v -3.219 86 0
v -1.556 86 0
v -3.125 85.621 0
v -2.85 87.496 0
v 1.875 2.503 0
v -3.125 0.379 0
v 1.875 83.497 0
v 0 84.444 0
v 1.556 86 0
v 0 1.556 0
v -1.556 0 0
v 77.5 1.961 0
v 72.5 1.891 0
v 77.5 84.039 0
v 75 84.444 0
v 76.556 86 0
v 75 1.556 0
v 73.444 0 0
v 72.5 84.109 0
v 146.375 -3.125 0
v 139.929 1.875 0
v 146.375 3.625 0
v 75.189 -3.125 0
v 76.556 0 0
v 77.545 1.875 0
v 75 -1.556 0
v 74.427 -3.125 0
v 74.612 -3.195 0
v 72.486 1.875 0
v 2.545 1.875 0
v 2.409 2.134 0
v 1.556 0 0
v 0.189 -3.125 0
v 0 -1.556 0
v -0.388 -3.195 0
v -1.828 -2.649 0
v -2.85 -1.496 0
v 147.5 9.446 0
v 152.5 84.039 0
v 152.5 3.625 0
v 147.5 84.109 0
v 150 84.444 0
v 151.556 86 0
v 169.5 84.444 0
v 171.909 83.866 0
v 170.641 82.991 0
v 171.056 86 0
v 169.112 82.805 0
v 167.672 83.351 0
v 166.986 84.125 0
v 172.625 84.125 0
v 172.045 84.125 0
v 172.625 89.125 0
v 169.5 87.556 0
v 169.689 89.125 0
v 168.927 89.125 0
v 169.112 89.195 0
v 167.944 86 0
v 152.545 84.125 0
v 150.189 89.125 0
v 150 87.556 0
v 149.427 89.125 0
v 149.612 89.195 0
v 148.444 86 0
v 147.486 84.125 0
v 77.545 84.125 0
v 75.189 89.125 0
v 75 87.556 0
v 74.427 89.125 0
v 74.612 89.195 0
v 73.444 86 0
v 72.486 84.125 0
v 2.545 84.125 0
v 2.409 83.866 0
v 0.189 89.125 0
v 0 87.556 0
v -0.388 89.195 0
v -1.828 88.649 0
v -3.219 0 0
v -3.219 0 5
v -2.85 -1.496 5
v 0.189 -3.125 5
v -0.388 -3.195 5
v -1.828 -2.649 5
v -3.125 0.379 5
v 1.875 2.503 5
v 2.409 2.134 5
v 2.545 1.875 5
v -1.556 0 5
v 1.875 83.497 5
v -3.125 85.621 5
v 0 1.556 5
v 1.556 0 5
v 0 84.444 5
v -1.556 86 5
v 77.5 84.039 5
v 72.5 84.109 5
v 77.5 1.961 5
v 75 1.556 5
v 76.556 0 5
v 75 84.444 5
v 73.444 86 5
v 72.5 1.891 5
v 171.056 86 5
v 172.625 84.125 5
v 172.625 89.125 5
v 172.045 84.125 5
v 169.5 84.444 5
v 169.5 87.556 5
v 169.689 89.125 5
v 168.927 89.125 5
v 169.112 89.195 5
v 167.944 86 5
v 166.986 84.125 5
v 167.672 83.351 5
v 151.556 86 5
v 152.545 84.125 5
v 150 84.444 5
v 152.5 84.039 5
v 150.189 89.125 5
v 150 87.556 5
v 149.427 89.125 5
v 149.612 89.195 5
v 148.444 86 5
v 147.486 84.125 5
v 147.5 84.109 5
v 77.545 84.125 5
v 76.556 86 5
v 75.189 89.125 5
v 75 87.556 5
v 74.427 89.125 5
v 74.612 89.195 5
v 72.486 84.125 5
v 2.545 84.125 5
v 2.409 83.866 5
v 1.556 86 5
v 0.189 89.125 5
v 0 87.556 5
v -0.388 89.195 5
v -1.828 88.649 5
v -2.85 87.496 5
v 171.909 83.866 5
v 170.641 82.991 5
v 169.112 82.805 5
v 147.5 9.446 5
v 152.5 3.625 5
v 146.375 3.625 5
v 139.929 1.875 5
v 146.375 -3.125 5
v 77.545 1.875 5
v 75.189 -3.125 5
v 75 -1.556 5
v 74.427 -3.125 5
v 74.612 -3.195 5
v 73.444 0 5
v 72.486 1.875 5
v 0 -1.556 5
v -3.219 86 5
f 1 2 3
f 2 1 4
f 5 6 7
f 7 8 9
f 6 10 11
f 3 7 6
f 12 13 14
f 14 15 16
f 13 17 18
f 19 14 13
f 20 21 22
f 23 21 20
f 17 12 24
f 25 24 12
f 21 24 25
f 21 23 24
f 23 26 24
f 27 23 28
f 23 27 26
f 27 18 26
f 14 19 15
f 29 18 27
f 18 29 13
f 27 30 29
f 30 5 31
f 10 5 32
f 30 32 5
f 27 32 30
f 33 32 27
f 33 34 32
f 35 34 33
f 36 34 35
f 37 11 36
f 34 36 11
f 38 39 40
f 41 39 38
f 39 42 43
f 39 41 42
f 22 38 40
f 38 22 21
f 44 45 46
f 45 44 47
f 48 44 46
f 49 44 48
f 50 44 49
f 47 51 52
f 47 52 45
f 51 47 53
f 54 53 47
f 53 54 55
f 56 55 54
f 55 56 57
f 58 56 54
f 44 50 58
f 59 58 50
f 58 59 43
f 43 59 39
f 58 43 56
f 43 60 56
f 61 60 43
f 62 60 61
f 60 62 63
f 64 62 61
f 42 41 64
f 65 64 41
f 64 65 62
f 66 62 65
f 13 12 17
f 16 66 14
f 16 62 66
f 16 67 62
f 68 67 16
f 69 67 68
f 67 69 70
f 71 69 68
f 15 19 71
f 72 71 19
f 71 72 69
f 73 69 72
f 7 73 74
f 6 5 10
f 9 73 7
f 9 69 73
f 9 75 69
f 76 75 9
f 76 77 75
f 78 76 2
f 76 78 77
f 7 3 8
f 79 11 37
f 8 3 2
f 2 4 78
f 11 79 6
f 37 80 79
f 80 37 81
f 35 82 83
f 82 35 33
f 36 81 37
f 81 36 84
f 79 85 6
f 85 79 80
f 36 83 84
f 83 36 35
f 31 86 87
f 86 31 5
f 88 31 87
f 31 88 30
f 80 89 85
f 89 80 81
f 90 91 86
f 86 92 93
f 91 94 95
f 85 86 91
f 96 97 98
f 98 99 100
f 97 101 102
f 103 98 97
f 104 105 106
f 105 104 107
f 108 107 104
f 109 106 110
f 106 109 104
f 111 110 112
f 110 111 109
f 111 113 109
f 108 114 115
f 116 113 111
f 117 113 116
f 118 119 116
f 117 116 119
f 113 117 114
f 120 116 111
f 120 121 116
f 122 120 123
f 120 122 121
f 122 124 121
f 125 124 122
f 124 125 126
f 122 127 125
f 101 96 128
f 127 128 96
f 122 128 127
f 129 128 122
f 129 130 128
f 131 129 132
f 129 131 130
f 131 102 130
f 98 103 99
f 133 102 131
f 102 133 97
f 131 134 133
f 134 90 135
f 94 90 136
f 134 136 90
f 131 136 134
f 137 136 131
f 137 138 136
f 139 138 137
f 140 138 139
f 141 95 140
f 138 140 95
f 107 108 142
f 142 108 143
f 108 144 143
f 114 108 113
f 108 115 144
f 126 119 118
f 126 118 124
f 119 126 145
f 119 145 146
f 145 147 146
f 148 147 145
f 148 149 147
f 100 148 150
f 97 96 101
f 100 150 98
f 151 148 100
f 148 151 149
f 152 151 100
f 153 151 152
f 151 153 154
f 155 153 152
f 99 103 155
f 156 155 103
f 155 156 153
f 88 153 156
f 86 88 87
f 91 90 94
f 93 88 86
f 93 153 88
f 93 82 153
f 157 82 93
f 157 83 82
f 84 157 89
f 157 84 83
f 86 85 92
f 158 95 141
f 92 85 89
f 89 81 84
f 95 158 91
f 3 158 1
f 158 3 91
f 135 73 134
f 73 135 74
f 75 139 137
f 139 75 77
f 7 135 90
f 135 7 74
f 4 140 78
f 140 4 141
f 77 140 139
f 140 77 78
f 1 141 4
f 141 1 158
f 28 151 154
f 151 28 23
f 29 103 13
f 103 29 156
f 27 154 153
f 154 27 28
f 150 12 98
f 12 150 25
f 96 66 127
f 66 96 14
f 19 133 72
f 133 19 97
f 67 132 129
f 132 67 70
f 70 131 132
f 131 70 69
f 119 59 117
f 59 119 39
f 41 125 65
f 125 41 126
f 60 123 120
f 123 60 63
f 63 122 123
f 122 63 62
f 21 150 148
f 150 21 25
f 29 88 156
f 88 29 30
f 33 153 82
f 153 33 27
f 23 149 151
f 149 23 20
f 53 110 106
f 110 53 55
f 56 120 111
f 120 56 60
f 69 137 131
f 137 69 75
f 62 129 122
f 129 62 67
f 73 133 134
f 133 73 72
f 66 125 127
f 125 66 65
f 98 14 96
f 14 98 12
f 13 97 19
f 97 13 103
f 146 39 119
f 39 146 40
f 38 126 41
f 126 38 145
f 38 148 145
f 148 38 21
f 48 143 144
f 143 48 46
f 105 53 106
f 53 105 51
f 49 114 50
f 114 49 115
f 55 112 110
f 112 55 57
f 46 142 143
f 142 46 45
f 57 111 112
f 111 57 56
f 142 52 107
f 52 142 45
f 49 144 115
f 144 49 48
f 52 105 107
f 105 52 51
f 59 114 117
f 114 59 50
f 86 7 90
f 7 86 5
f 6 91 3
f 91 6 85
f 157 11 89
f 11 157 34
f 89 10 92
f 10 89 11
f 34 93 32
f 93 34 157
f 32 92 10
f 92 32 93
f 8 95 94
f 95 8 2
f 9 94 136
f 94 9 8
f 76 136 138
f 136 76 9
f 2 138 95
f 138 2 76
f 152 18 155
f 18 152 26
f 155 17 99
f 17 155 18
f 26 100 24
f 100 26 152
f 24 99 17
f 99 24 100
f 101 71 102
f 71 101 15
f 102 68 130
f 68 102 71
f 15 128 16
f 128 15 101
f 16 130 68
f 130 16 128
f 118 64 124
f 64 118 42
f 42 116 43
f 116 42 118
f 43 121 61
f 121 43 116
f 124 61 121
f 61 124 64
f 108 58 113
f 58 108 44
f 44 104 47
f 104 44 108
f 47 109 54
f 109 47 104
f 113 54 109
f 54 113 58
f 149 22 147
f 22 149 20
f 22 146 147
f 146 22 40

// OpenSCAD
/**
 * Combine with '32x8 LED Matrix grid for diffuser'
 * https://www.thingiverse.com/thing:1903744
 *
 * 12x 2.6x10mm plastic screws
 *
 *   -- noah@hack.se, 2018
 *
 */


module polyhole(d, h) {
    n = max(round(2 * d),3);
    rotate([0,0,180])
        cylinder(h = h, r = (d / 2) / cos (180 / n), $fn = n);
}

thickness=5;
cylSize=6.25;
screwXDistance=75;
screwYDistance=86;

difference() {
    union() {
        // 2x3 screw holes
        for(x=[0,1,2]) {
            translate([x*screwXDistance,0,0]) polyhole(d=cylSize, h=thickness);
            translate([x*screwXDistance,screwYDistance,0]) polyhole(d=cylSize, h=thickness);
        }
        // Stabilizator
        translate([2*screwXDistance-8,-cylSize/2,0]) rotate([0,0,45])cube([14,5,thickness]); 
        translate([2*screwXDistance+19.5,screwYDistance,0]) polyhole(d=cylSize, h=thickness);

        // X beams to joins screw holes
        for(x=[0,1]) {
            translate([x*screwXDistance,-cylSize/2,0]) cube([screwXDistance,thickness, thickness]);
            translate([x*screwXDistance,cylSize/2-thickness+screwYDistance,0]) cube([screwXDistance,thickness, thickness]);
        }
        // Stabilizator
        translate([2*screwXDistance,cylSize/2-thickness+screwYDistance,0]) cube([19.5+cylSize/2,thickness, thickness]);

        // Y beam to join screw holes
        translate([-cylSize/2,0,0]) cube([thickness, 86, thickness]);
        for(x=[1,2])
        translate([x*screwXDistance-thickness/2, 0, 0]) cube([thickness, screwYDistance, thickness]);
    }
    // Screw holes
    for(x=[0,1,2]) {
        translate([x*screwXDistance,0,-1]) polyhole(d=2.2, h=thickness+2);
        translate([x*screwXDistance,screwYDistance,-1]) polyhole(d=2.2, h=thickness+2);
    }
    // Stabilizator hole
    translate([2*screwXDistance+19.5,screwYDistance,-1]) polyhole(d=2.2, h=thickness+2);
    // Stabilizator removal bottom side
#    translate([2*screwXDistance-cylSize/2-0.5,-cylSize/2-0.5,-1]) cube([cylSize+1,cylSize+1, thickness+2]);
}
